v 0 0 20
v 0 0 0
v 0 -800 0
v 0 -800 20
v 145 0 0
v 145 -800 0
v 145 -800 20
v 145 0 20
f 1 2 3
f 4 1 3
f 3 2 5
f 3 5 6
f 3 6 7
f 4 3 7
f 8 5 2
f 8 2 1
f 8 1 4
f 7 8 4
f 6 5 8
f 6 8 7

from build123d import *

# Parameters (mm, degrees)
F0_W     = 40.3330735862
F0_H     = 25.4436098039
F1_DEPTH = 800
F2_DEPTH = 20
F3_DEPTH = 25
F4_DEPTH = 145


with BuildPart() as f1:
    # F0 (on Front) → F1 (new body)
    with BuildSketch(Plane.XZ):
        with Locations((20.1665367931, 12.721804902)):
            Rectangle(F0_W, F0_H)
    extrude(amount=F1_DEPTH)

    # F2 (intersect): a face of the model
    f2_faces = [f1.faces().sort_by_distance(p)[0] for p in [
        (20.1665367931, -400, 0),
    ]]
    extrude(f2_faces, amount=-F2_DEPTH, mode=Mode.INTERSECT)

    # F3 (add): a face of the model
    f3_faces = [f1.faces().sort_by_distance(p)[0] for p in [
        (0, -400, 10),
    ]]
    extrude(f3_faces, amount=-F3_DEPTH)

    # F4 (add): a face of the model
    f4_faces = [f1.faces().sort_by_distance(p)[0] for p in [
        (0, -400, 10),
    ]]
    extrude(f4_faces, amount=-F4_DEPTH)


solid = f1.part
